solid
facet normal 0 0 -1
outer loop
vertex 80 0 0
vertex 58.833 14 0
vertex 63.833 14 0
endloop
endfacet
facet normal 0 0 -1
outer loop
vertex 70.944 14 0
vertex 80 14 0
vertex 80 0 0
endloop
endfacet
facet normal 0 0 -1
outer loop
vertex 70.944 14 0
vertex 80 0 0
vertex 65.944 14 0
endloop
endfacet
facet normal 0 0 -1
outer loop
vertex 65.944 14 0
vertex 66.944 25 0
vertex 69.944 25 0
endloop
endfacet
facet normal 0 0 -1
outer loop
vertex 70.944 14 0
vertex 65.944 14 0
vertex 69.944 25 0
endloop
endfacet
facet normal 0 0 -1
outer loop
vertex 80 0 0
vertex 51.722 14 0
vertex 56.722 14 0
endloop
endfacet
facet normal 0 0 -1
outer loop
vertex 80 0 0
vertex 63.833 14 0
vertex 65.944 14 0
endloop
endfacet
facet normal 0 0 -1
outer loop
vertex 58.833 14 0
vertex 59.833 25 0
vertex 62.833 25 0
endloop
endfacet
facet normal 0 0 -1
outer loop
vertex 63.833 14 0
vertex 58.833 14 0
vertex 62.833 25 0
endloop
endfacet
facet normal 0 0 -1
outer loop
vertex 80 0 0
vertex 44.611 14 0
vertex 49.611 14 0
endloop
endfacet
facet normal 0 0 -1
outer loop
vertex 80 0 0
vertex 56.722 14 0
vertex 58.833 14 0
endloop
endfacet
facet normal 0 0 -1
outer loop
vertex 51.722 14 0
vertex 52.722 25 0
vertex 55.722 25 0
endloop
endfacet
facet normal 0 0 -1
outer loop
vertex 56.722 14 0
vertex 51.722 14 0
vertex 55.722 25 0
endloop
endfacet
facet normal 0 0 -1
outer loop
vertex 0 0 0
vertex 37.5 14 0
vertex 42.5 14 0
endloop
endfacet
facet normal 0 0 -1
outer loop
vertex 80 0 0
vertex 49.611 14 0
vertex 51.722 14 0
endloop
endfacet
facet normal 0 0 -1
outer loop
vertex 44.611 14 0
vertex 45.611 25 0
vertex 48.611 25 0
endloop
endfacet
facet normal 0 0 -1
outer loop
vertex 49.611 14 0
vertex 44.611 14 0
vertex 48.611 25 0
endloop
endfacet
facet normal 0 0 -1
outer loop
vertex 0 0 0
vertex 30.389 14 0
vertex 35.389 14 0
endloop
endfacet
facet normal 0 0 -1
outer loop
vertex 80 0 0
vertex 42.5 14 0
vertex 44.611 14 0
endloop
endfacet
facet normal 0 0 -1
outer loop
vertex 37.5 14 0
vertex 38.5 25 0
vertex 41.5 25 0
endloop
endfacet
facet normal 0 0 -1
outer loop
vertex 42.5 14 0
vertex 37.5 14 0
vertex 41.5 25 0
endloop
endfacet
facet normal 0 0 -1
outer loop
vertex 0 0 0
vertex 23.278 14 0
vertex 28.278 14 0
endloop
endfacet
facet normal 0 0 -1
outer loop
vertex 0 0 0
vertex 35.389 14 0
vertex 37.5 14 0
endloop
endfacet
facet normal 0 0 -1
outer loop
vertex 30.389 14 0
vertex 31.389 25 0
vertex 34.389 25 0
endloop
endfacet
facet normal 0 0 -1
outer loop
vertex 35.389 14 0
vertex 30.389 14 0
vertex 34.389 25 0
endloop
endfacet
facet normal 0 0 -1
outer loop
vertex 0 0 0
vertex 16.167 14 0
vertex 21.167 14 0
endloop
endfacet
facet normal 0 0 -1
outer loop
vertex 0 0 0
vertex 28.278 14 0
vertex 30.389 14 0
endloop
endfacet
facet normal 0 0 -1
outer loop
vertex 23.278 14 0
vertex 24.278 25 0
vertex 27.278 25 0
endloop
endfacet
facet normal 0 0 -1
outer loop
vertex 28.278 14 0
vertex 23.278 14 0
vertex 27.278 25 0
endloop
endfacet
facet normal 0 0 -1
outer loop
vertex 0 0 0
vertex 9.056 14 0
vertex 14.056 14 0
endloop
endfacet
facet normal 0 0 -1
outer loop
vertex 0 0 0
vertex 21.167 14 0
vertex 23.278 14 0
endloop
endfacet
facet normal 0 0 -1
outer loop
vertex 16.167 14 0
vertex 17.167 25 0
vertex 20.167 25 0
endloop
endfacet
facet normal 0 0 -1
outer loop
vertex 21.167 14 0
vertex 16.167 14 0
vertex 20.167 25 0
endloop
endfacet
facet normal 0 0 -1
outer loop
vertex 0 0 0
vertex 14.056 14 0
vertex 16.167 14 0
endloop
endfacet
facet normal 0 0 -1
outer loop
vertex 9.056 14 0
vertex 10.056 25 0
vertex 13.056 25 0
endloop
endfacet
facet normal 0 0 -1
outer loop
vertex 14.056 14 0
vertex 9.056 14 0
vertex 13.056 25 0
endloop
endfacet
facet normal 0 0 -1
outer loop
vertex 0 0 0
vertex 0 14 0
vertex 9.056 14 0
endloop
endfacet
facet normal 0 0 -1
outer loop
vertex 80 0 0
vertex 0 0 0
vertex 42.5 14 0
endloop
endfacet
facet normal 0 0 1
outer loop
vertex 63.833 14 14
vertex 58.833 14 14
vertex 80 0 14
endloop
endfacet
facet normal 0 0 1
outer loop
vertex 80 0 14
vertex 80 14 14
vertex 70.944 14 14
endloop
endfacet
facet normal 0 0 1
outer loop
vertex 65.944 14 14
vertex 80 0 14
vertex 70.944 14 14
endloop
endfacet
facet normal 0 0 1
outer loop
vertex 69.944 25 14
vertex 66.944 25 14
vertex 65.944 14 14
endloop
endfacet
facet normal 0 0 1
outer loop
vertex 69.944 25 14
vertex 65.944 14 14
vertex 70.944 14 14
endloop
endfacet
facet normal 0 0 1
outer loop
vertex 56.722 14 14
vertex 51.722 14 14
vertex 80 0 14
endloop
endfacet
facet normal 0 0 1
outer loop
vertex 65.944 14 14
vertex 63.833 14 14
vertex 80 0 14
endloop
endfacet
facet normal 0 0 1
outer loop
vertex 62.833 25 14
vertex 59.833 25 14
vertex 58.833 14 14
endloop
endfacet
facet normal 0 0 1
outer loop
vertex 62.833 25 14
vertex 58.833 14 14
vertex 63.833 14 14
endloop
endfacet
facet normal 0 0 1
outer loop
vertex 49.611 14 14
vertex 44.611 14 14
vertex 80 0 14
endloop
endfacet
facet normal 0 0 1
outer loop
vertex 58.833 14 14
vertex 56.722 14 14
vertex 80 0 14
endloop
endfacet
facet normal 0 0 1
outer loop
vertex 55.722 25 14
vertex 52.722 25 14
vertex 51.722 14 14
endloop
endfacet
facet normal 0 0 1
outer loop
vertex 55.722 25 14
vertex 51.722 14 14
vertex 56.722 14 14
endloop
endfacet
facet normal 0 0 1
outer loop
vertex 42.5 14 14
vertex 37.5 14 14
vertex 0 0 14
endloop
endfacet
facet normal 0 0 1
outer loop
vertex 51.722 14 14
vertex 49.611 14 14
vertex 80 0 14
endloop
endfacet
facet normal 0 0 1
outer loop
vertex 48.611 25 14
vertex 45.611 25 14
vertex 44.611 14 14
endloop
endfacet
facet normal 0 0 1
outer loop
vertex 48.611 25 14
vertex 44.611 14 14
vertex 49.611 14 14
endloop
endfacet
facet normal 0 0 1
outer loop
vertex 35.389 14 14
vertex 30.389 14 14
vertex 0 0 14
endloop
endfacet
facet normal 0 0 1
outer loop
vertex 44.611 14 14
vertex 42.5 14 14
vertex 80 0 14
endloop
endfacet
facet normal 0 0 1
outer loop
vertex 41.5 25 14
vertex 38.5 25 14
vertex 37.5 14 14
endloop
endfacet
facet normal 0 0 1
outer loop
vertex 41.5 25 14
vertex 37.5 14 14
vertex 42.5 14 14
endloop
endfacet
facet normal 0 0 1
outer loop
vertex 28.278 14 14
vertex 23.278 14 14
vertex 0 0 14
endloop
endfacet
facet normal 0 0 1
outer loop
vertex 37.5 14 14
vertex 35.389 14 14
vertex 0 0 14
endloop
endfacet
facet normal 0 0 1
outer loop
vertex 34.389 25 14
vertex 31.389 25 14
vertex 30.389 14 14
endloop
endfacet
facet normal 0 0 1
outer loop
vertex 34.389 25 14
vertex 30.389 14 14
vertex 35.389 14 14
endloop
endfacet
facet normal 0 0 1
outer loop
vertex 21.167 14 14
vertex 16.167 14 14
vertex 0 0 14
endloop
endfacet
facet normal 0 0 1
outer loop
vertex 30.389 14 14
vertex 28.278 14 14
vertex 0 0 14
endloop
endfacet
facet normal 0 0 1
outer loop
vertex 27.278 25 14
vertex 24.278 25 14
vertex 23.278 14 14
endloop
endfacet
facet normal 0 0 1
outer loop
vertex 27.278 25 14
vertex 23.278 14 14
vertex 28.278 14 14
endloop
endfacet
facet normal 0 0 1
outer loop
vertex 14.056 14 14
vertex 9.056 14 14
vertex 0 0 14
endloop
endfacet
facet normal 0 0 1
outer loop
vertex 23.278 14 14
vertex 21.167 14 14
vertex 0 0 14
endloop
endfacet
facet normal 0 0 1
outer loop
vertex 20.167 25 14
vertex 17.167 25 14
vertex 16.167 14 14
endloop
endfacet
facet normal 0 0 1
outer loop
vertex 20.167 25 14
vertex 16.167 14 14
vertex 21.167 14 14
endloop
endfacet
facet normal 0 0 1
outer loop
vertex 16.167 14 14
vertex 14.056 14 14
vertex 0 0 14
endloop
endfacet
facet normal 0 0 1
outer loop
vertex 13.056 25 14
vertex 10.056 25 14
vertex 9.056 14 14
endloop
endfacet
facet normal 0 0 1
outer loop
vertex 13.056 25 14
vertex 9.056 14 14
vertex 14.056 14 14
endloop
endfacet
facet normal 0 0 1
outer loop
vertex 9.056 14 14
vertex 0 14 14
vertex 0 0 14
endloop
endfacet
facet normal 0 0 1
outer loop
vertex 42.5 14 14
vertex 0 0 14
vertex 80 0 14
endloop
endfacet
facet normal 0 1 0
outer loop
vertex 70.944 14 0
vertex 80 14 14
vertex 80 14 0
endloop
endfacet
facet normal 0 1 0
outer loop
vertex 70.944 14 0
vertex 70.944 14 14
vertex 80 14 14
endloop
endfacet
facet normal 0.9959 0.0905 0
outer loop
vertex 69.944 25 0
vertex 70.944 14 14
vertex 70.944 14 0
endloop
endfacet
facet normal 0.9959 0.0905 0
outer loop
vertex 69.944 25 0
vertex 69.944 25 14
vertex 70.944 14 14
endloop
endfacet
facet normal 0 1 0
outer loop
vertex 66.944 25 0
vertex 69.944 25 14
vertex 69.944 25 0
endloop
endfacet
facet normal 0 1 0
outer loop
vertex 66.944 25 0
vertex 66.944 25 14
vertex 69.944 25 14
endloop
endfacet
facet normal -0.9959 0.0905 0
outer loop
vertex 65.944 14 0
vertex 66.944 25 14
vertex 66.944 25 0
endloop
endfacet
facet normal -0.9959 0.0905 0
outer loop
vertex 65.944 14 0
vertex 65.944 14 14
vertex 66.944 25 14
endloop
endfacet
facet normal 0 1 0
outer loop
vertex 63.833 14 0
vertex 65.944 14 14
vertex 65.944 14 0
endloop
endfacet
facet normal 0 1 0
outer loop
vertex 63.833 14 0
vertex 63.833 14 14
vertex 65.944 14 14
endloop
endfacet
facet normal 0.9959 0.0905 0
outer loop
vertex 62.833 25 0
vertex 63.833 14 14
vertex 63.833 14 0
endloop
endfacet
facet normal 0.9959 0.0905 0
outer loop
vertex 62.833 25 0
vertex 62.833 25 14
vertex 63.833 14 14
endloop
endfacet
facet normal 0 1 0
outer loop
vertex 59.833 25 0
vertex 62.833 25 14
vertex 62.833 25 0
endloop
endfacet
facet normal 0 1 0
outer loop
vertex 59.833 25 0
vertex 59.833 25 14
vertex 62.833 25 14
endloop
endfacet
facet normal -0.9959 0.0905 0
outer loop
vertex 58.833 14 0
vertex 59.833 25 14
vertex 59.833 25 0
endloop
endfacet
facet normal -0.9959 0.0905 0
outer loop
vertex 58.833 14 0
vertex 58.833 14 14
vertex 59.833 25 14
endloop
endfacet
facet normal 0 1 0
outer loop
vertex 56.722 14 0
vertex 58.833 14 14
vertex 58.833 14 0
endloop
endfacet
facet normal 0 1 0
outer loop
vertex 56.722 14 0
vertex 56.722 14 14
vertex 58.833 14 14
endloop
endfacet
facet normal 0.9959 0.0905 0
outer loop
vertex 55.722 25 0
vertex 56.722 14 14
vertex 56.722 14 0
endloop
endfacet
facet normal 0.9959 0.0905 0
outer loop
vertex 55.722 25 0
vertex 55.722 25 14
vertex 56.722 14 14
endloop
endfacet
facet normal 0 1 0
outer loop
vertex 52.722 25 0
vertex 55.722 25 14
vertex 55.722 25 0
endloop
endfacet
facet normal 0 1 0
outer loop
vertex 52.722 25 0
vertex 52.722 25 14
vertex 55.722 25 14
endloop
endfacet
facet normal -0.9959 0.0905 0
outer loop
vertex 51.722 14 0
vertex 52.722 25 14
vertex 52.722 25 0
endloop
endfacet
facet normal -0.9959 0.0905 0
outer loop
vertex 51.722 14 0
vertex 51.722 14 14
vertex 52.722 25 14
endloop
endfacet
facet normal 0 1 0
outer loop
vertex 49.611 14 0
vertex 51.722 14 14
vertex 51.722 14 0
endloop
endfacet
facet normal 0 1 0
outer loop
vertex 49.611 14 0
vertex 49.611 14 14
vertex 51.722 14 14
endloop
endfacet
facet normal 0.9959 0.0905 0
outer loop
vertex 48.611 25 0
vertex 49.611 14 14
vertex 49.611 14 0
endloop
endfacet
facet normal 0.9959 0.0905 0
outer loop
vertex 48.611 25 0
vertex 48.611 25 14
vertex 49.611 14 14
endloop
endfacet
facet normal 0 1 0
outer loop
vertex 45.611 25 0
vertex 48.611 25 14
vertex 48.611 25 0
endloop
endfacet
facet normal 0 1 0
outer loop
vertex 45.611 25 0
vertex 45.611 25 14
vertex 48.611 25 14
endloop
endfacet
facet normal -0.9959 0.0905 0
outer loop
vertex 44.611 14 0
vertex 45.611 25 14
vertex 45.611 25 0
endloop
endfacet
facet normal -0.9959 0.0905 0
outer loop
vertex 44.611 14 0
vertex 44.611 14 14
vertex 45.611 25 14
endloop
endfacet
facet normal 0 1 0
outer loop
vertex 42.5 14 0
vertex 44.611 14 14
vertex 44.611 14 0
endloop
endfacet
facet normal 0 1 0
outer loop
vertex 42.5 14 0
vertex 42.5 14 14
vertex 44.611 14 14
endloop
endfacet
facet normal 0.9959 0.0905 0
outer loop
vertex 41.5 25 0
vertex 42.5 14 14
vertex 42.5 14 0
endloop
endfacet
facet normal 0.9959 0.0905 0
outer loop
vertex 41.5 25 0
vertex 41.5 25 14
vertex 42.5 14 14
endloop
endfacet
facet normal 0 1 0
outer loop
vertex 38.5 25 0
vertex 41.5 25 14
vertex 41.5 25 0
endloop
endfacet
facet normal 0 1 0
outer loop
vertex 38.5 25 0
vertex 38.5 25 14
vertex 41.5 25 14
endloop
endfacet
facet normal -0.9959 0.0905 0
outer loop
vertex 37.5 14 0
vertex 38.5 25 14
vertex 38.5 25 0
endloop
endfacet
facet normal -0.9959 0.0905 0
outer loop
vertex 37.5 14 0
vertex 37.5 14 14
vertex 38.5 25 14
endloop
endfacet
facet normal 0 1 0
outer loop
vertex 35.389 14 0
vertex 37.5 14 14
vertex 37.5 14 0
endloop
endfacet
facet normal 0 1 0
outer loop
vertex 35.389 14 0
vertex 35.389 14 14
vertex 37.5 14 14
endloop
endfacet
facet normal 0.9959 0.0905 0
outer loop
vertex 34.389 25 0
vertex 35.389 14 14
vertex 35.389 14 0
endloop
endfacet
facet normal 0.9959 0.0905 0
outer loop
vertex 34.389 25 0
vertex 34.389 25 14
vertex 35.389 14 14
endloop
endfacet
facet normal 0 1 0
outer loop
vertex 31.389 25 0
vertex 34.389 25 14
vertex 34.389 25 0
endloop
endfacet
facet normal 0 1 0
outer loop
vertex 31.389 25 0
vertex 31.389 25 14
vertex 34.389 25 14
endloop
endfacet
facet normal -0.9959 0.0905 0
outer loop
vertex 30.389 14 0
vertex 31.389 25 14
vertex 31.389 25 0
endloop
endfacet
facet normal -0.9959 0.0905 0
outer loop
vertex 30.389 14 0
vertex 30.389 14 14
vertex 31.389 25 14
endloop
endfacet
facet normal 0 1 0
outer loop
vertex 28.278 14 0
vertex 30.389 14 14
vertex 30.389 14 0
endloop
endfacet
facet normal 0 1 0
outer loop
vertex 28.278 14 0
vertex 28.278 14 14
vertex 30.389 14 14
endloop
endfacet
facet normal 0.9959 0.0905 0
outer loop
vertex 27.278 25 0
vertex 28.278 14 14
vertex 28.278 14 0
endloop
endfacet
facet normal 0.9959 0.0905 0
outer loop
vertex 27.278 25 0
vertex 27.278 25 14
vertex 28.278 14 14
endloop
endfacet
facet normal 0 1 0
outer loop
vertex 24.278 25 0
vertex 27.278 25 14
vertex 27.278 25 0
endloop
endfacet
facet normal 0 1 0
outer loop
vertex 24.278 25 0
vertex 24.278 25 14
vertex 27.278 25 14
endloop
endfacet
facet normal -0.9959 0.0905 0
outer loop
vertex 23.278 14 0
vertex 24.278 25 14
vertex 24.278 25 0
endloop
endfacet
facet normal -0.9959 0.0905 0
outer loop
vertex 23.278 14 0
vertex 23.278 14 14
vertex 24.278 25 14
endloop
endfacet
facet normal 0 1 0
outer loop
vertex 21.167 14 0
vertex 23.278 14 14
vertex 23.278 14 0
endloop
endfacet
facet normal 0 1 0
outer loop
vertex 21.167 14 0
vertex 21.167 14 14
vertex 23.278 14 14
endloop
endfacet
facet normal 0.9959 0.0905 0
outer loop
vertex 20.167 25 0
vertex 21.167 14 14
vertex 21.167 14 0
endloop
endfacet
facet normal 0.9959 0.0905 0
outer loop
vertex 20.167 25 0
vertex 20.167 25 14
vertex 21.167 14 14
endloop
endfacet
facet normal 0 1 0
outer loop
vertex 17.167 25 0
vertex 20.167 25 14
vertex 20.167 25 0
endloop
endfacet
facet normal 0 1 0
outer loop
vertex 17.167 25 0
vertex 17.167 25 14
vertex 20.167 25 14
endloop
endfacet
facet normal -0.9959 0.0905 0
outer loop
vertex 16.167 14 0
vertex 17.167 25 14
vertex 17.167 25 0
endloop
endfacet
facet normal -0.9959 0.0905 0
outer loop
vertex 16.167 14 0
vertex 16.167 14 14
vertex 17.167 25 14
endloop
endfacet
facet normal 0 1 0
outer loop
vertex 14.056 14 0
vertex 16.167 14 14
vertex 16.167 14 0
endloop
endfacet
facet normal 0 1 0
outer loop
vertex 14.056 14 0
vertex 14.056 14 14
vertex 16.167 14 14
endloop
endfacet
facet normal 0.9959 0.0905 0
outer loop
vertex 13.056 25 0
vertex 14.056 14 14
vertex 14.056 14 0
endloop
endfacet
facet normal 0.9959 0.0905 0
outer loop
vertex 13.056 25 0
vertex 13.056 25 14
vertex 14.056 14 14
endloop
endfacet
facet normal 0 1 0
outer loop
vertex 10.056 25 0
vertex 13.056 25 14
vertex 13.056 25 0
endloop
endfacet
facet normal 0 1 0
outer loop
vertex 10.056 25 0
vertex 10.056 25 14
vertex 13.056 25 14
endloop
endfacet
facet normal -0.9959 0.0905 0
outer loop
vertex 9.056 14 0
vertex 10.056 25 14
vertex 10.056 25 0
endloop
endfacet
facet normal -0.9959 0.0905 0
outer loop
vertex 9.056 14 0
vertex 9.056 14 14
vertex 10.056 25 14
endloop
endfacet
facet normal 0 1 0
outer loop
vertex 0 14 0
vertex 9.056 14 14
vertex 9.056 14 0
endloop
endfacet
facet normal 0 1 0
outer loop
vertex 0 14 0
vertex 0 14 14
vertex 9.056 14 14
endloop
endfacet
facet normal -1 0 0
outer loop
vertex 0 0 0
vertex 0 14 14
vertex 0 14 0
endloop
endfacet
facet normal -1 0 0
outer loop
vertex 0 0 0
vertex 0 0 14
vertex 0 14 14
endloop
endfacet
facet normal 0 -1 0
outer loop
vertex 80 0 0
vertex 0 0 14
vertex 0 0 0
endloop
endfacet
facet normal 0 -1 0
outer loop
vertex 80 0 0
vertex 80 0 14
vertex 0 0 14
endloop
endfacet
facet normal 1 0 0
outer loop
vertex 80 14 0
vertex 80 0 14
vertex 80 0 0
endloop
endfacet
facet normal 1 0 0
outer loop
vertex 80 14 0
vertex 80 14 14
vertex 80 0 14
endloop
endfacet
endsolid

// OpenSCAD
$fn = 32;

// ----------------------------------------------------------------------
// Gear rack: 9 teeth on a 80 mm bar, pitch 7.11 mm
// ----------------------------------------------------------------------

// --- parameters (mm) ---
profile_height = 14;      // extrusion height
profile_points = 40;      // points of the closed outline

profile = [[0, 0], [80, 0], [80, 14], [70.944, 14], [69.944, 25], [66.944, 25], [65.944, 14], [63.833, 14], [62.833, 25], [59.833, 25], [58.833, 14], [56.722, 14], [55.722, 25], [52.722, 25], [51.722, 14], [49.611, 14], [48.611, 25], [45.611, 25], [44.611, 14], [42.5, 14], [41.5, 25], [38.5, 25], [37.5, 14], [35.389, 14], [34.389, 25], [31.389, 25], [30.389, 14], [28.278, 14], [27.278, 25], [24.278, 25], [23.278, 14], [21.167, 14], [20.167, 25], [17.167, 25], [16.167, 14], [14.056, 14], [13.056, 25], [10.056, 25], [9.056, 14], [0, 14]];  // single closed polygon, 40 points, counter clockwise

// --- the one profile operation ---
linear_extrude(height = profile_height) polygon(points = profile);
